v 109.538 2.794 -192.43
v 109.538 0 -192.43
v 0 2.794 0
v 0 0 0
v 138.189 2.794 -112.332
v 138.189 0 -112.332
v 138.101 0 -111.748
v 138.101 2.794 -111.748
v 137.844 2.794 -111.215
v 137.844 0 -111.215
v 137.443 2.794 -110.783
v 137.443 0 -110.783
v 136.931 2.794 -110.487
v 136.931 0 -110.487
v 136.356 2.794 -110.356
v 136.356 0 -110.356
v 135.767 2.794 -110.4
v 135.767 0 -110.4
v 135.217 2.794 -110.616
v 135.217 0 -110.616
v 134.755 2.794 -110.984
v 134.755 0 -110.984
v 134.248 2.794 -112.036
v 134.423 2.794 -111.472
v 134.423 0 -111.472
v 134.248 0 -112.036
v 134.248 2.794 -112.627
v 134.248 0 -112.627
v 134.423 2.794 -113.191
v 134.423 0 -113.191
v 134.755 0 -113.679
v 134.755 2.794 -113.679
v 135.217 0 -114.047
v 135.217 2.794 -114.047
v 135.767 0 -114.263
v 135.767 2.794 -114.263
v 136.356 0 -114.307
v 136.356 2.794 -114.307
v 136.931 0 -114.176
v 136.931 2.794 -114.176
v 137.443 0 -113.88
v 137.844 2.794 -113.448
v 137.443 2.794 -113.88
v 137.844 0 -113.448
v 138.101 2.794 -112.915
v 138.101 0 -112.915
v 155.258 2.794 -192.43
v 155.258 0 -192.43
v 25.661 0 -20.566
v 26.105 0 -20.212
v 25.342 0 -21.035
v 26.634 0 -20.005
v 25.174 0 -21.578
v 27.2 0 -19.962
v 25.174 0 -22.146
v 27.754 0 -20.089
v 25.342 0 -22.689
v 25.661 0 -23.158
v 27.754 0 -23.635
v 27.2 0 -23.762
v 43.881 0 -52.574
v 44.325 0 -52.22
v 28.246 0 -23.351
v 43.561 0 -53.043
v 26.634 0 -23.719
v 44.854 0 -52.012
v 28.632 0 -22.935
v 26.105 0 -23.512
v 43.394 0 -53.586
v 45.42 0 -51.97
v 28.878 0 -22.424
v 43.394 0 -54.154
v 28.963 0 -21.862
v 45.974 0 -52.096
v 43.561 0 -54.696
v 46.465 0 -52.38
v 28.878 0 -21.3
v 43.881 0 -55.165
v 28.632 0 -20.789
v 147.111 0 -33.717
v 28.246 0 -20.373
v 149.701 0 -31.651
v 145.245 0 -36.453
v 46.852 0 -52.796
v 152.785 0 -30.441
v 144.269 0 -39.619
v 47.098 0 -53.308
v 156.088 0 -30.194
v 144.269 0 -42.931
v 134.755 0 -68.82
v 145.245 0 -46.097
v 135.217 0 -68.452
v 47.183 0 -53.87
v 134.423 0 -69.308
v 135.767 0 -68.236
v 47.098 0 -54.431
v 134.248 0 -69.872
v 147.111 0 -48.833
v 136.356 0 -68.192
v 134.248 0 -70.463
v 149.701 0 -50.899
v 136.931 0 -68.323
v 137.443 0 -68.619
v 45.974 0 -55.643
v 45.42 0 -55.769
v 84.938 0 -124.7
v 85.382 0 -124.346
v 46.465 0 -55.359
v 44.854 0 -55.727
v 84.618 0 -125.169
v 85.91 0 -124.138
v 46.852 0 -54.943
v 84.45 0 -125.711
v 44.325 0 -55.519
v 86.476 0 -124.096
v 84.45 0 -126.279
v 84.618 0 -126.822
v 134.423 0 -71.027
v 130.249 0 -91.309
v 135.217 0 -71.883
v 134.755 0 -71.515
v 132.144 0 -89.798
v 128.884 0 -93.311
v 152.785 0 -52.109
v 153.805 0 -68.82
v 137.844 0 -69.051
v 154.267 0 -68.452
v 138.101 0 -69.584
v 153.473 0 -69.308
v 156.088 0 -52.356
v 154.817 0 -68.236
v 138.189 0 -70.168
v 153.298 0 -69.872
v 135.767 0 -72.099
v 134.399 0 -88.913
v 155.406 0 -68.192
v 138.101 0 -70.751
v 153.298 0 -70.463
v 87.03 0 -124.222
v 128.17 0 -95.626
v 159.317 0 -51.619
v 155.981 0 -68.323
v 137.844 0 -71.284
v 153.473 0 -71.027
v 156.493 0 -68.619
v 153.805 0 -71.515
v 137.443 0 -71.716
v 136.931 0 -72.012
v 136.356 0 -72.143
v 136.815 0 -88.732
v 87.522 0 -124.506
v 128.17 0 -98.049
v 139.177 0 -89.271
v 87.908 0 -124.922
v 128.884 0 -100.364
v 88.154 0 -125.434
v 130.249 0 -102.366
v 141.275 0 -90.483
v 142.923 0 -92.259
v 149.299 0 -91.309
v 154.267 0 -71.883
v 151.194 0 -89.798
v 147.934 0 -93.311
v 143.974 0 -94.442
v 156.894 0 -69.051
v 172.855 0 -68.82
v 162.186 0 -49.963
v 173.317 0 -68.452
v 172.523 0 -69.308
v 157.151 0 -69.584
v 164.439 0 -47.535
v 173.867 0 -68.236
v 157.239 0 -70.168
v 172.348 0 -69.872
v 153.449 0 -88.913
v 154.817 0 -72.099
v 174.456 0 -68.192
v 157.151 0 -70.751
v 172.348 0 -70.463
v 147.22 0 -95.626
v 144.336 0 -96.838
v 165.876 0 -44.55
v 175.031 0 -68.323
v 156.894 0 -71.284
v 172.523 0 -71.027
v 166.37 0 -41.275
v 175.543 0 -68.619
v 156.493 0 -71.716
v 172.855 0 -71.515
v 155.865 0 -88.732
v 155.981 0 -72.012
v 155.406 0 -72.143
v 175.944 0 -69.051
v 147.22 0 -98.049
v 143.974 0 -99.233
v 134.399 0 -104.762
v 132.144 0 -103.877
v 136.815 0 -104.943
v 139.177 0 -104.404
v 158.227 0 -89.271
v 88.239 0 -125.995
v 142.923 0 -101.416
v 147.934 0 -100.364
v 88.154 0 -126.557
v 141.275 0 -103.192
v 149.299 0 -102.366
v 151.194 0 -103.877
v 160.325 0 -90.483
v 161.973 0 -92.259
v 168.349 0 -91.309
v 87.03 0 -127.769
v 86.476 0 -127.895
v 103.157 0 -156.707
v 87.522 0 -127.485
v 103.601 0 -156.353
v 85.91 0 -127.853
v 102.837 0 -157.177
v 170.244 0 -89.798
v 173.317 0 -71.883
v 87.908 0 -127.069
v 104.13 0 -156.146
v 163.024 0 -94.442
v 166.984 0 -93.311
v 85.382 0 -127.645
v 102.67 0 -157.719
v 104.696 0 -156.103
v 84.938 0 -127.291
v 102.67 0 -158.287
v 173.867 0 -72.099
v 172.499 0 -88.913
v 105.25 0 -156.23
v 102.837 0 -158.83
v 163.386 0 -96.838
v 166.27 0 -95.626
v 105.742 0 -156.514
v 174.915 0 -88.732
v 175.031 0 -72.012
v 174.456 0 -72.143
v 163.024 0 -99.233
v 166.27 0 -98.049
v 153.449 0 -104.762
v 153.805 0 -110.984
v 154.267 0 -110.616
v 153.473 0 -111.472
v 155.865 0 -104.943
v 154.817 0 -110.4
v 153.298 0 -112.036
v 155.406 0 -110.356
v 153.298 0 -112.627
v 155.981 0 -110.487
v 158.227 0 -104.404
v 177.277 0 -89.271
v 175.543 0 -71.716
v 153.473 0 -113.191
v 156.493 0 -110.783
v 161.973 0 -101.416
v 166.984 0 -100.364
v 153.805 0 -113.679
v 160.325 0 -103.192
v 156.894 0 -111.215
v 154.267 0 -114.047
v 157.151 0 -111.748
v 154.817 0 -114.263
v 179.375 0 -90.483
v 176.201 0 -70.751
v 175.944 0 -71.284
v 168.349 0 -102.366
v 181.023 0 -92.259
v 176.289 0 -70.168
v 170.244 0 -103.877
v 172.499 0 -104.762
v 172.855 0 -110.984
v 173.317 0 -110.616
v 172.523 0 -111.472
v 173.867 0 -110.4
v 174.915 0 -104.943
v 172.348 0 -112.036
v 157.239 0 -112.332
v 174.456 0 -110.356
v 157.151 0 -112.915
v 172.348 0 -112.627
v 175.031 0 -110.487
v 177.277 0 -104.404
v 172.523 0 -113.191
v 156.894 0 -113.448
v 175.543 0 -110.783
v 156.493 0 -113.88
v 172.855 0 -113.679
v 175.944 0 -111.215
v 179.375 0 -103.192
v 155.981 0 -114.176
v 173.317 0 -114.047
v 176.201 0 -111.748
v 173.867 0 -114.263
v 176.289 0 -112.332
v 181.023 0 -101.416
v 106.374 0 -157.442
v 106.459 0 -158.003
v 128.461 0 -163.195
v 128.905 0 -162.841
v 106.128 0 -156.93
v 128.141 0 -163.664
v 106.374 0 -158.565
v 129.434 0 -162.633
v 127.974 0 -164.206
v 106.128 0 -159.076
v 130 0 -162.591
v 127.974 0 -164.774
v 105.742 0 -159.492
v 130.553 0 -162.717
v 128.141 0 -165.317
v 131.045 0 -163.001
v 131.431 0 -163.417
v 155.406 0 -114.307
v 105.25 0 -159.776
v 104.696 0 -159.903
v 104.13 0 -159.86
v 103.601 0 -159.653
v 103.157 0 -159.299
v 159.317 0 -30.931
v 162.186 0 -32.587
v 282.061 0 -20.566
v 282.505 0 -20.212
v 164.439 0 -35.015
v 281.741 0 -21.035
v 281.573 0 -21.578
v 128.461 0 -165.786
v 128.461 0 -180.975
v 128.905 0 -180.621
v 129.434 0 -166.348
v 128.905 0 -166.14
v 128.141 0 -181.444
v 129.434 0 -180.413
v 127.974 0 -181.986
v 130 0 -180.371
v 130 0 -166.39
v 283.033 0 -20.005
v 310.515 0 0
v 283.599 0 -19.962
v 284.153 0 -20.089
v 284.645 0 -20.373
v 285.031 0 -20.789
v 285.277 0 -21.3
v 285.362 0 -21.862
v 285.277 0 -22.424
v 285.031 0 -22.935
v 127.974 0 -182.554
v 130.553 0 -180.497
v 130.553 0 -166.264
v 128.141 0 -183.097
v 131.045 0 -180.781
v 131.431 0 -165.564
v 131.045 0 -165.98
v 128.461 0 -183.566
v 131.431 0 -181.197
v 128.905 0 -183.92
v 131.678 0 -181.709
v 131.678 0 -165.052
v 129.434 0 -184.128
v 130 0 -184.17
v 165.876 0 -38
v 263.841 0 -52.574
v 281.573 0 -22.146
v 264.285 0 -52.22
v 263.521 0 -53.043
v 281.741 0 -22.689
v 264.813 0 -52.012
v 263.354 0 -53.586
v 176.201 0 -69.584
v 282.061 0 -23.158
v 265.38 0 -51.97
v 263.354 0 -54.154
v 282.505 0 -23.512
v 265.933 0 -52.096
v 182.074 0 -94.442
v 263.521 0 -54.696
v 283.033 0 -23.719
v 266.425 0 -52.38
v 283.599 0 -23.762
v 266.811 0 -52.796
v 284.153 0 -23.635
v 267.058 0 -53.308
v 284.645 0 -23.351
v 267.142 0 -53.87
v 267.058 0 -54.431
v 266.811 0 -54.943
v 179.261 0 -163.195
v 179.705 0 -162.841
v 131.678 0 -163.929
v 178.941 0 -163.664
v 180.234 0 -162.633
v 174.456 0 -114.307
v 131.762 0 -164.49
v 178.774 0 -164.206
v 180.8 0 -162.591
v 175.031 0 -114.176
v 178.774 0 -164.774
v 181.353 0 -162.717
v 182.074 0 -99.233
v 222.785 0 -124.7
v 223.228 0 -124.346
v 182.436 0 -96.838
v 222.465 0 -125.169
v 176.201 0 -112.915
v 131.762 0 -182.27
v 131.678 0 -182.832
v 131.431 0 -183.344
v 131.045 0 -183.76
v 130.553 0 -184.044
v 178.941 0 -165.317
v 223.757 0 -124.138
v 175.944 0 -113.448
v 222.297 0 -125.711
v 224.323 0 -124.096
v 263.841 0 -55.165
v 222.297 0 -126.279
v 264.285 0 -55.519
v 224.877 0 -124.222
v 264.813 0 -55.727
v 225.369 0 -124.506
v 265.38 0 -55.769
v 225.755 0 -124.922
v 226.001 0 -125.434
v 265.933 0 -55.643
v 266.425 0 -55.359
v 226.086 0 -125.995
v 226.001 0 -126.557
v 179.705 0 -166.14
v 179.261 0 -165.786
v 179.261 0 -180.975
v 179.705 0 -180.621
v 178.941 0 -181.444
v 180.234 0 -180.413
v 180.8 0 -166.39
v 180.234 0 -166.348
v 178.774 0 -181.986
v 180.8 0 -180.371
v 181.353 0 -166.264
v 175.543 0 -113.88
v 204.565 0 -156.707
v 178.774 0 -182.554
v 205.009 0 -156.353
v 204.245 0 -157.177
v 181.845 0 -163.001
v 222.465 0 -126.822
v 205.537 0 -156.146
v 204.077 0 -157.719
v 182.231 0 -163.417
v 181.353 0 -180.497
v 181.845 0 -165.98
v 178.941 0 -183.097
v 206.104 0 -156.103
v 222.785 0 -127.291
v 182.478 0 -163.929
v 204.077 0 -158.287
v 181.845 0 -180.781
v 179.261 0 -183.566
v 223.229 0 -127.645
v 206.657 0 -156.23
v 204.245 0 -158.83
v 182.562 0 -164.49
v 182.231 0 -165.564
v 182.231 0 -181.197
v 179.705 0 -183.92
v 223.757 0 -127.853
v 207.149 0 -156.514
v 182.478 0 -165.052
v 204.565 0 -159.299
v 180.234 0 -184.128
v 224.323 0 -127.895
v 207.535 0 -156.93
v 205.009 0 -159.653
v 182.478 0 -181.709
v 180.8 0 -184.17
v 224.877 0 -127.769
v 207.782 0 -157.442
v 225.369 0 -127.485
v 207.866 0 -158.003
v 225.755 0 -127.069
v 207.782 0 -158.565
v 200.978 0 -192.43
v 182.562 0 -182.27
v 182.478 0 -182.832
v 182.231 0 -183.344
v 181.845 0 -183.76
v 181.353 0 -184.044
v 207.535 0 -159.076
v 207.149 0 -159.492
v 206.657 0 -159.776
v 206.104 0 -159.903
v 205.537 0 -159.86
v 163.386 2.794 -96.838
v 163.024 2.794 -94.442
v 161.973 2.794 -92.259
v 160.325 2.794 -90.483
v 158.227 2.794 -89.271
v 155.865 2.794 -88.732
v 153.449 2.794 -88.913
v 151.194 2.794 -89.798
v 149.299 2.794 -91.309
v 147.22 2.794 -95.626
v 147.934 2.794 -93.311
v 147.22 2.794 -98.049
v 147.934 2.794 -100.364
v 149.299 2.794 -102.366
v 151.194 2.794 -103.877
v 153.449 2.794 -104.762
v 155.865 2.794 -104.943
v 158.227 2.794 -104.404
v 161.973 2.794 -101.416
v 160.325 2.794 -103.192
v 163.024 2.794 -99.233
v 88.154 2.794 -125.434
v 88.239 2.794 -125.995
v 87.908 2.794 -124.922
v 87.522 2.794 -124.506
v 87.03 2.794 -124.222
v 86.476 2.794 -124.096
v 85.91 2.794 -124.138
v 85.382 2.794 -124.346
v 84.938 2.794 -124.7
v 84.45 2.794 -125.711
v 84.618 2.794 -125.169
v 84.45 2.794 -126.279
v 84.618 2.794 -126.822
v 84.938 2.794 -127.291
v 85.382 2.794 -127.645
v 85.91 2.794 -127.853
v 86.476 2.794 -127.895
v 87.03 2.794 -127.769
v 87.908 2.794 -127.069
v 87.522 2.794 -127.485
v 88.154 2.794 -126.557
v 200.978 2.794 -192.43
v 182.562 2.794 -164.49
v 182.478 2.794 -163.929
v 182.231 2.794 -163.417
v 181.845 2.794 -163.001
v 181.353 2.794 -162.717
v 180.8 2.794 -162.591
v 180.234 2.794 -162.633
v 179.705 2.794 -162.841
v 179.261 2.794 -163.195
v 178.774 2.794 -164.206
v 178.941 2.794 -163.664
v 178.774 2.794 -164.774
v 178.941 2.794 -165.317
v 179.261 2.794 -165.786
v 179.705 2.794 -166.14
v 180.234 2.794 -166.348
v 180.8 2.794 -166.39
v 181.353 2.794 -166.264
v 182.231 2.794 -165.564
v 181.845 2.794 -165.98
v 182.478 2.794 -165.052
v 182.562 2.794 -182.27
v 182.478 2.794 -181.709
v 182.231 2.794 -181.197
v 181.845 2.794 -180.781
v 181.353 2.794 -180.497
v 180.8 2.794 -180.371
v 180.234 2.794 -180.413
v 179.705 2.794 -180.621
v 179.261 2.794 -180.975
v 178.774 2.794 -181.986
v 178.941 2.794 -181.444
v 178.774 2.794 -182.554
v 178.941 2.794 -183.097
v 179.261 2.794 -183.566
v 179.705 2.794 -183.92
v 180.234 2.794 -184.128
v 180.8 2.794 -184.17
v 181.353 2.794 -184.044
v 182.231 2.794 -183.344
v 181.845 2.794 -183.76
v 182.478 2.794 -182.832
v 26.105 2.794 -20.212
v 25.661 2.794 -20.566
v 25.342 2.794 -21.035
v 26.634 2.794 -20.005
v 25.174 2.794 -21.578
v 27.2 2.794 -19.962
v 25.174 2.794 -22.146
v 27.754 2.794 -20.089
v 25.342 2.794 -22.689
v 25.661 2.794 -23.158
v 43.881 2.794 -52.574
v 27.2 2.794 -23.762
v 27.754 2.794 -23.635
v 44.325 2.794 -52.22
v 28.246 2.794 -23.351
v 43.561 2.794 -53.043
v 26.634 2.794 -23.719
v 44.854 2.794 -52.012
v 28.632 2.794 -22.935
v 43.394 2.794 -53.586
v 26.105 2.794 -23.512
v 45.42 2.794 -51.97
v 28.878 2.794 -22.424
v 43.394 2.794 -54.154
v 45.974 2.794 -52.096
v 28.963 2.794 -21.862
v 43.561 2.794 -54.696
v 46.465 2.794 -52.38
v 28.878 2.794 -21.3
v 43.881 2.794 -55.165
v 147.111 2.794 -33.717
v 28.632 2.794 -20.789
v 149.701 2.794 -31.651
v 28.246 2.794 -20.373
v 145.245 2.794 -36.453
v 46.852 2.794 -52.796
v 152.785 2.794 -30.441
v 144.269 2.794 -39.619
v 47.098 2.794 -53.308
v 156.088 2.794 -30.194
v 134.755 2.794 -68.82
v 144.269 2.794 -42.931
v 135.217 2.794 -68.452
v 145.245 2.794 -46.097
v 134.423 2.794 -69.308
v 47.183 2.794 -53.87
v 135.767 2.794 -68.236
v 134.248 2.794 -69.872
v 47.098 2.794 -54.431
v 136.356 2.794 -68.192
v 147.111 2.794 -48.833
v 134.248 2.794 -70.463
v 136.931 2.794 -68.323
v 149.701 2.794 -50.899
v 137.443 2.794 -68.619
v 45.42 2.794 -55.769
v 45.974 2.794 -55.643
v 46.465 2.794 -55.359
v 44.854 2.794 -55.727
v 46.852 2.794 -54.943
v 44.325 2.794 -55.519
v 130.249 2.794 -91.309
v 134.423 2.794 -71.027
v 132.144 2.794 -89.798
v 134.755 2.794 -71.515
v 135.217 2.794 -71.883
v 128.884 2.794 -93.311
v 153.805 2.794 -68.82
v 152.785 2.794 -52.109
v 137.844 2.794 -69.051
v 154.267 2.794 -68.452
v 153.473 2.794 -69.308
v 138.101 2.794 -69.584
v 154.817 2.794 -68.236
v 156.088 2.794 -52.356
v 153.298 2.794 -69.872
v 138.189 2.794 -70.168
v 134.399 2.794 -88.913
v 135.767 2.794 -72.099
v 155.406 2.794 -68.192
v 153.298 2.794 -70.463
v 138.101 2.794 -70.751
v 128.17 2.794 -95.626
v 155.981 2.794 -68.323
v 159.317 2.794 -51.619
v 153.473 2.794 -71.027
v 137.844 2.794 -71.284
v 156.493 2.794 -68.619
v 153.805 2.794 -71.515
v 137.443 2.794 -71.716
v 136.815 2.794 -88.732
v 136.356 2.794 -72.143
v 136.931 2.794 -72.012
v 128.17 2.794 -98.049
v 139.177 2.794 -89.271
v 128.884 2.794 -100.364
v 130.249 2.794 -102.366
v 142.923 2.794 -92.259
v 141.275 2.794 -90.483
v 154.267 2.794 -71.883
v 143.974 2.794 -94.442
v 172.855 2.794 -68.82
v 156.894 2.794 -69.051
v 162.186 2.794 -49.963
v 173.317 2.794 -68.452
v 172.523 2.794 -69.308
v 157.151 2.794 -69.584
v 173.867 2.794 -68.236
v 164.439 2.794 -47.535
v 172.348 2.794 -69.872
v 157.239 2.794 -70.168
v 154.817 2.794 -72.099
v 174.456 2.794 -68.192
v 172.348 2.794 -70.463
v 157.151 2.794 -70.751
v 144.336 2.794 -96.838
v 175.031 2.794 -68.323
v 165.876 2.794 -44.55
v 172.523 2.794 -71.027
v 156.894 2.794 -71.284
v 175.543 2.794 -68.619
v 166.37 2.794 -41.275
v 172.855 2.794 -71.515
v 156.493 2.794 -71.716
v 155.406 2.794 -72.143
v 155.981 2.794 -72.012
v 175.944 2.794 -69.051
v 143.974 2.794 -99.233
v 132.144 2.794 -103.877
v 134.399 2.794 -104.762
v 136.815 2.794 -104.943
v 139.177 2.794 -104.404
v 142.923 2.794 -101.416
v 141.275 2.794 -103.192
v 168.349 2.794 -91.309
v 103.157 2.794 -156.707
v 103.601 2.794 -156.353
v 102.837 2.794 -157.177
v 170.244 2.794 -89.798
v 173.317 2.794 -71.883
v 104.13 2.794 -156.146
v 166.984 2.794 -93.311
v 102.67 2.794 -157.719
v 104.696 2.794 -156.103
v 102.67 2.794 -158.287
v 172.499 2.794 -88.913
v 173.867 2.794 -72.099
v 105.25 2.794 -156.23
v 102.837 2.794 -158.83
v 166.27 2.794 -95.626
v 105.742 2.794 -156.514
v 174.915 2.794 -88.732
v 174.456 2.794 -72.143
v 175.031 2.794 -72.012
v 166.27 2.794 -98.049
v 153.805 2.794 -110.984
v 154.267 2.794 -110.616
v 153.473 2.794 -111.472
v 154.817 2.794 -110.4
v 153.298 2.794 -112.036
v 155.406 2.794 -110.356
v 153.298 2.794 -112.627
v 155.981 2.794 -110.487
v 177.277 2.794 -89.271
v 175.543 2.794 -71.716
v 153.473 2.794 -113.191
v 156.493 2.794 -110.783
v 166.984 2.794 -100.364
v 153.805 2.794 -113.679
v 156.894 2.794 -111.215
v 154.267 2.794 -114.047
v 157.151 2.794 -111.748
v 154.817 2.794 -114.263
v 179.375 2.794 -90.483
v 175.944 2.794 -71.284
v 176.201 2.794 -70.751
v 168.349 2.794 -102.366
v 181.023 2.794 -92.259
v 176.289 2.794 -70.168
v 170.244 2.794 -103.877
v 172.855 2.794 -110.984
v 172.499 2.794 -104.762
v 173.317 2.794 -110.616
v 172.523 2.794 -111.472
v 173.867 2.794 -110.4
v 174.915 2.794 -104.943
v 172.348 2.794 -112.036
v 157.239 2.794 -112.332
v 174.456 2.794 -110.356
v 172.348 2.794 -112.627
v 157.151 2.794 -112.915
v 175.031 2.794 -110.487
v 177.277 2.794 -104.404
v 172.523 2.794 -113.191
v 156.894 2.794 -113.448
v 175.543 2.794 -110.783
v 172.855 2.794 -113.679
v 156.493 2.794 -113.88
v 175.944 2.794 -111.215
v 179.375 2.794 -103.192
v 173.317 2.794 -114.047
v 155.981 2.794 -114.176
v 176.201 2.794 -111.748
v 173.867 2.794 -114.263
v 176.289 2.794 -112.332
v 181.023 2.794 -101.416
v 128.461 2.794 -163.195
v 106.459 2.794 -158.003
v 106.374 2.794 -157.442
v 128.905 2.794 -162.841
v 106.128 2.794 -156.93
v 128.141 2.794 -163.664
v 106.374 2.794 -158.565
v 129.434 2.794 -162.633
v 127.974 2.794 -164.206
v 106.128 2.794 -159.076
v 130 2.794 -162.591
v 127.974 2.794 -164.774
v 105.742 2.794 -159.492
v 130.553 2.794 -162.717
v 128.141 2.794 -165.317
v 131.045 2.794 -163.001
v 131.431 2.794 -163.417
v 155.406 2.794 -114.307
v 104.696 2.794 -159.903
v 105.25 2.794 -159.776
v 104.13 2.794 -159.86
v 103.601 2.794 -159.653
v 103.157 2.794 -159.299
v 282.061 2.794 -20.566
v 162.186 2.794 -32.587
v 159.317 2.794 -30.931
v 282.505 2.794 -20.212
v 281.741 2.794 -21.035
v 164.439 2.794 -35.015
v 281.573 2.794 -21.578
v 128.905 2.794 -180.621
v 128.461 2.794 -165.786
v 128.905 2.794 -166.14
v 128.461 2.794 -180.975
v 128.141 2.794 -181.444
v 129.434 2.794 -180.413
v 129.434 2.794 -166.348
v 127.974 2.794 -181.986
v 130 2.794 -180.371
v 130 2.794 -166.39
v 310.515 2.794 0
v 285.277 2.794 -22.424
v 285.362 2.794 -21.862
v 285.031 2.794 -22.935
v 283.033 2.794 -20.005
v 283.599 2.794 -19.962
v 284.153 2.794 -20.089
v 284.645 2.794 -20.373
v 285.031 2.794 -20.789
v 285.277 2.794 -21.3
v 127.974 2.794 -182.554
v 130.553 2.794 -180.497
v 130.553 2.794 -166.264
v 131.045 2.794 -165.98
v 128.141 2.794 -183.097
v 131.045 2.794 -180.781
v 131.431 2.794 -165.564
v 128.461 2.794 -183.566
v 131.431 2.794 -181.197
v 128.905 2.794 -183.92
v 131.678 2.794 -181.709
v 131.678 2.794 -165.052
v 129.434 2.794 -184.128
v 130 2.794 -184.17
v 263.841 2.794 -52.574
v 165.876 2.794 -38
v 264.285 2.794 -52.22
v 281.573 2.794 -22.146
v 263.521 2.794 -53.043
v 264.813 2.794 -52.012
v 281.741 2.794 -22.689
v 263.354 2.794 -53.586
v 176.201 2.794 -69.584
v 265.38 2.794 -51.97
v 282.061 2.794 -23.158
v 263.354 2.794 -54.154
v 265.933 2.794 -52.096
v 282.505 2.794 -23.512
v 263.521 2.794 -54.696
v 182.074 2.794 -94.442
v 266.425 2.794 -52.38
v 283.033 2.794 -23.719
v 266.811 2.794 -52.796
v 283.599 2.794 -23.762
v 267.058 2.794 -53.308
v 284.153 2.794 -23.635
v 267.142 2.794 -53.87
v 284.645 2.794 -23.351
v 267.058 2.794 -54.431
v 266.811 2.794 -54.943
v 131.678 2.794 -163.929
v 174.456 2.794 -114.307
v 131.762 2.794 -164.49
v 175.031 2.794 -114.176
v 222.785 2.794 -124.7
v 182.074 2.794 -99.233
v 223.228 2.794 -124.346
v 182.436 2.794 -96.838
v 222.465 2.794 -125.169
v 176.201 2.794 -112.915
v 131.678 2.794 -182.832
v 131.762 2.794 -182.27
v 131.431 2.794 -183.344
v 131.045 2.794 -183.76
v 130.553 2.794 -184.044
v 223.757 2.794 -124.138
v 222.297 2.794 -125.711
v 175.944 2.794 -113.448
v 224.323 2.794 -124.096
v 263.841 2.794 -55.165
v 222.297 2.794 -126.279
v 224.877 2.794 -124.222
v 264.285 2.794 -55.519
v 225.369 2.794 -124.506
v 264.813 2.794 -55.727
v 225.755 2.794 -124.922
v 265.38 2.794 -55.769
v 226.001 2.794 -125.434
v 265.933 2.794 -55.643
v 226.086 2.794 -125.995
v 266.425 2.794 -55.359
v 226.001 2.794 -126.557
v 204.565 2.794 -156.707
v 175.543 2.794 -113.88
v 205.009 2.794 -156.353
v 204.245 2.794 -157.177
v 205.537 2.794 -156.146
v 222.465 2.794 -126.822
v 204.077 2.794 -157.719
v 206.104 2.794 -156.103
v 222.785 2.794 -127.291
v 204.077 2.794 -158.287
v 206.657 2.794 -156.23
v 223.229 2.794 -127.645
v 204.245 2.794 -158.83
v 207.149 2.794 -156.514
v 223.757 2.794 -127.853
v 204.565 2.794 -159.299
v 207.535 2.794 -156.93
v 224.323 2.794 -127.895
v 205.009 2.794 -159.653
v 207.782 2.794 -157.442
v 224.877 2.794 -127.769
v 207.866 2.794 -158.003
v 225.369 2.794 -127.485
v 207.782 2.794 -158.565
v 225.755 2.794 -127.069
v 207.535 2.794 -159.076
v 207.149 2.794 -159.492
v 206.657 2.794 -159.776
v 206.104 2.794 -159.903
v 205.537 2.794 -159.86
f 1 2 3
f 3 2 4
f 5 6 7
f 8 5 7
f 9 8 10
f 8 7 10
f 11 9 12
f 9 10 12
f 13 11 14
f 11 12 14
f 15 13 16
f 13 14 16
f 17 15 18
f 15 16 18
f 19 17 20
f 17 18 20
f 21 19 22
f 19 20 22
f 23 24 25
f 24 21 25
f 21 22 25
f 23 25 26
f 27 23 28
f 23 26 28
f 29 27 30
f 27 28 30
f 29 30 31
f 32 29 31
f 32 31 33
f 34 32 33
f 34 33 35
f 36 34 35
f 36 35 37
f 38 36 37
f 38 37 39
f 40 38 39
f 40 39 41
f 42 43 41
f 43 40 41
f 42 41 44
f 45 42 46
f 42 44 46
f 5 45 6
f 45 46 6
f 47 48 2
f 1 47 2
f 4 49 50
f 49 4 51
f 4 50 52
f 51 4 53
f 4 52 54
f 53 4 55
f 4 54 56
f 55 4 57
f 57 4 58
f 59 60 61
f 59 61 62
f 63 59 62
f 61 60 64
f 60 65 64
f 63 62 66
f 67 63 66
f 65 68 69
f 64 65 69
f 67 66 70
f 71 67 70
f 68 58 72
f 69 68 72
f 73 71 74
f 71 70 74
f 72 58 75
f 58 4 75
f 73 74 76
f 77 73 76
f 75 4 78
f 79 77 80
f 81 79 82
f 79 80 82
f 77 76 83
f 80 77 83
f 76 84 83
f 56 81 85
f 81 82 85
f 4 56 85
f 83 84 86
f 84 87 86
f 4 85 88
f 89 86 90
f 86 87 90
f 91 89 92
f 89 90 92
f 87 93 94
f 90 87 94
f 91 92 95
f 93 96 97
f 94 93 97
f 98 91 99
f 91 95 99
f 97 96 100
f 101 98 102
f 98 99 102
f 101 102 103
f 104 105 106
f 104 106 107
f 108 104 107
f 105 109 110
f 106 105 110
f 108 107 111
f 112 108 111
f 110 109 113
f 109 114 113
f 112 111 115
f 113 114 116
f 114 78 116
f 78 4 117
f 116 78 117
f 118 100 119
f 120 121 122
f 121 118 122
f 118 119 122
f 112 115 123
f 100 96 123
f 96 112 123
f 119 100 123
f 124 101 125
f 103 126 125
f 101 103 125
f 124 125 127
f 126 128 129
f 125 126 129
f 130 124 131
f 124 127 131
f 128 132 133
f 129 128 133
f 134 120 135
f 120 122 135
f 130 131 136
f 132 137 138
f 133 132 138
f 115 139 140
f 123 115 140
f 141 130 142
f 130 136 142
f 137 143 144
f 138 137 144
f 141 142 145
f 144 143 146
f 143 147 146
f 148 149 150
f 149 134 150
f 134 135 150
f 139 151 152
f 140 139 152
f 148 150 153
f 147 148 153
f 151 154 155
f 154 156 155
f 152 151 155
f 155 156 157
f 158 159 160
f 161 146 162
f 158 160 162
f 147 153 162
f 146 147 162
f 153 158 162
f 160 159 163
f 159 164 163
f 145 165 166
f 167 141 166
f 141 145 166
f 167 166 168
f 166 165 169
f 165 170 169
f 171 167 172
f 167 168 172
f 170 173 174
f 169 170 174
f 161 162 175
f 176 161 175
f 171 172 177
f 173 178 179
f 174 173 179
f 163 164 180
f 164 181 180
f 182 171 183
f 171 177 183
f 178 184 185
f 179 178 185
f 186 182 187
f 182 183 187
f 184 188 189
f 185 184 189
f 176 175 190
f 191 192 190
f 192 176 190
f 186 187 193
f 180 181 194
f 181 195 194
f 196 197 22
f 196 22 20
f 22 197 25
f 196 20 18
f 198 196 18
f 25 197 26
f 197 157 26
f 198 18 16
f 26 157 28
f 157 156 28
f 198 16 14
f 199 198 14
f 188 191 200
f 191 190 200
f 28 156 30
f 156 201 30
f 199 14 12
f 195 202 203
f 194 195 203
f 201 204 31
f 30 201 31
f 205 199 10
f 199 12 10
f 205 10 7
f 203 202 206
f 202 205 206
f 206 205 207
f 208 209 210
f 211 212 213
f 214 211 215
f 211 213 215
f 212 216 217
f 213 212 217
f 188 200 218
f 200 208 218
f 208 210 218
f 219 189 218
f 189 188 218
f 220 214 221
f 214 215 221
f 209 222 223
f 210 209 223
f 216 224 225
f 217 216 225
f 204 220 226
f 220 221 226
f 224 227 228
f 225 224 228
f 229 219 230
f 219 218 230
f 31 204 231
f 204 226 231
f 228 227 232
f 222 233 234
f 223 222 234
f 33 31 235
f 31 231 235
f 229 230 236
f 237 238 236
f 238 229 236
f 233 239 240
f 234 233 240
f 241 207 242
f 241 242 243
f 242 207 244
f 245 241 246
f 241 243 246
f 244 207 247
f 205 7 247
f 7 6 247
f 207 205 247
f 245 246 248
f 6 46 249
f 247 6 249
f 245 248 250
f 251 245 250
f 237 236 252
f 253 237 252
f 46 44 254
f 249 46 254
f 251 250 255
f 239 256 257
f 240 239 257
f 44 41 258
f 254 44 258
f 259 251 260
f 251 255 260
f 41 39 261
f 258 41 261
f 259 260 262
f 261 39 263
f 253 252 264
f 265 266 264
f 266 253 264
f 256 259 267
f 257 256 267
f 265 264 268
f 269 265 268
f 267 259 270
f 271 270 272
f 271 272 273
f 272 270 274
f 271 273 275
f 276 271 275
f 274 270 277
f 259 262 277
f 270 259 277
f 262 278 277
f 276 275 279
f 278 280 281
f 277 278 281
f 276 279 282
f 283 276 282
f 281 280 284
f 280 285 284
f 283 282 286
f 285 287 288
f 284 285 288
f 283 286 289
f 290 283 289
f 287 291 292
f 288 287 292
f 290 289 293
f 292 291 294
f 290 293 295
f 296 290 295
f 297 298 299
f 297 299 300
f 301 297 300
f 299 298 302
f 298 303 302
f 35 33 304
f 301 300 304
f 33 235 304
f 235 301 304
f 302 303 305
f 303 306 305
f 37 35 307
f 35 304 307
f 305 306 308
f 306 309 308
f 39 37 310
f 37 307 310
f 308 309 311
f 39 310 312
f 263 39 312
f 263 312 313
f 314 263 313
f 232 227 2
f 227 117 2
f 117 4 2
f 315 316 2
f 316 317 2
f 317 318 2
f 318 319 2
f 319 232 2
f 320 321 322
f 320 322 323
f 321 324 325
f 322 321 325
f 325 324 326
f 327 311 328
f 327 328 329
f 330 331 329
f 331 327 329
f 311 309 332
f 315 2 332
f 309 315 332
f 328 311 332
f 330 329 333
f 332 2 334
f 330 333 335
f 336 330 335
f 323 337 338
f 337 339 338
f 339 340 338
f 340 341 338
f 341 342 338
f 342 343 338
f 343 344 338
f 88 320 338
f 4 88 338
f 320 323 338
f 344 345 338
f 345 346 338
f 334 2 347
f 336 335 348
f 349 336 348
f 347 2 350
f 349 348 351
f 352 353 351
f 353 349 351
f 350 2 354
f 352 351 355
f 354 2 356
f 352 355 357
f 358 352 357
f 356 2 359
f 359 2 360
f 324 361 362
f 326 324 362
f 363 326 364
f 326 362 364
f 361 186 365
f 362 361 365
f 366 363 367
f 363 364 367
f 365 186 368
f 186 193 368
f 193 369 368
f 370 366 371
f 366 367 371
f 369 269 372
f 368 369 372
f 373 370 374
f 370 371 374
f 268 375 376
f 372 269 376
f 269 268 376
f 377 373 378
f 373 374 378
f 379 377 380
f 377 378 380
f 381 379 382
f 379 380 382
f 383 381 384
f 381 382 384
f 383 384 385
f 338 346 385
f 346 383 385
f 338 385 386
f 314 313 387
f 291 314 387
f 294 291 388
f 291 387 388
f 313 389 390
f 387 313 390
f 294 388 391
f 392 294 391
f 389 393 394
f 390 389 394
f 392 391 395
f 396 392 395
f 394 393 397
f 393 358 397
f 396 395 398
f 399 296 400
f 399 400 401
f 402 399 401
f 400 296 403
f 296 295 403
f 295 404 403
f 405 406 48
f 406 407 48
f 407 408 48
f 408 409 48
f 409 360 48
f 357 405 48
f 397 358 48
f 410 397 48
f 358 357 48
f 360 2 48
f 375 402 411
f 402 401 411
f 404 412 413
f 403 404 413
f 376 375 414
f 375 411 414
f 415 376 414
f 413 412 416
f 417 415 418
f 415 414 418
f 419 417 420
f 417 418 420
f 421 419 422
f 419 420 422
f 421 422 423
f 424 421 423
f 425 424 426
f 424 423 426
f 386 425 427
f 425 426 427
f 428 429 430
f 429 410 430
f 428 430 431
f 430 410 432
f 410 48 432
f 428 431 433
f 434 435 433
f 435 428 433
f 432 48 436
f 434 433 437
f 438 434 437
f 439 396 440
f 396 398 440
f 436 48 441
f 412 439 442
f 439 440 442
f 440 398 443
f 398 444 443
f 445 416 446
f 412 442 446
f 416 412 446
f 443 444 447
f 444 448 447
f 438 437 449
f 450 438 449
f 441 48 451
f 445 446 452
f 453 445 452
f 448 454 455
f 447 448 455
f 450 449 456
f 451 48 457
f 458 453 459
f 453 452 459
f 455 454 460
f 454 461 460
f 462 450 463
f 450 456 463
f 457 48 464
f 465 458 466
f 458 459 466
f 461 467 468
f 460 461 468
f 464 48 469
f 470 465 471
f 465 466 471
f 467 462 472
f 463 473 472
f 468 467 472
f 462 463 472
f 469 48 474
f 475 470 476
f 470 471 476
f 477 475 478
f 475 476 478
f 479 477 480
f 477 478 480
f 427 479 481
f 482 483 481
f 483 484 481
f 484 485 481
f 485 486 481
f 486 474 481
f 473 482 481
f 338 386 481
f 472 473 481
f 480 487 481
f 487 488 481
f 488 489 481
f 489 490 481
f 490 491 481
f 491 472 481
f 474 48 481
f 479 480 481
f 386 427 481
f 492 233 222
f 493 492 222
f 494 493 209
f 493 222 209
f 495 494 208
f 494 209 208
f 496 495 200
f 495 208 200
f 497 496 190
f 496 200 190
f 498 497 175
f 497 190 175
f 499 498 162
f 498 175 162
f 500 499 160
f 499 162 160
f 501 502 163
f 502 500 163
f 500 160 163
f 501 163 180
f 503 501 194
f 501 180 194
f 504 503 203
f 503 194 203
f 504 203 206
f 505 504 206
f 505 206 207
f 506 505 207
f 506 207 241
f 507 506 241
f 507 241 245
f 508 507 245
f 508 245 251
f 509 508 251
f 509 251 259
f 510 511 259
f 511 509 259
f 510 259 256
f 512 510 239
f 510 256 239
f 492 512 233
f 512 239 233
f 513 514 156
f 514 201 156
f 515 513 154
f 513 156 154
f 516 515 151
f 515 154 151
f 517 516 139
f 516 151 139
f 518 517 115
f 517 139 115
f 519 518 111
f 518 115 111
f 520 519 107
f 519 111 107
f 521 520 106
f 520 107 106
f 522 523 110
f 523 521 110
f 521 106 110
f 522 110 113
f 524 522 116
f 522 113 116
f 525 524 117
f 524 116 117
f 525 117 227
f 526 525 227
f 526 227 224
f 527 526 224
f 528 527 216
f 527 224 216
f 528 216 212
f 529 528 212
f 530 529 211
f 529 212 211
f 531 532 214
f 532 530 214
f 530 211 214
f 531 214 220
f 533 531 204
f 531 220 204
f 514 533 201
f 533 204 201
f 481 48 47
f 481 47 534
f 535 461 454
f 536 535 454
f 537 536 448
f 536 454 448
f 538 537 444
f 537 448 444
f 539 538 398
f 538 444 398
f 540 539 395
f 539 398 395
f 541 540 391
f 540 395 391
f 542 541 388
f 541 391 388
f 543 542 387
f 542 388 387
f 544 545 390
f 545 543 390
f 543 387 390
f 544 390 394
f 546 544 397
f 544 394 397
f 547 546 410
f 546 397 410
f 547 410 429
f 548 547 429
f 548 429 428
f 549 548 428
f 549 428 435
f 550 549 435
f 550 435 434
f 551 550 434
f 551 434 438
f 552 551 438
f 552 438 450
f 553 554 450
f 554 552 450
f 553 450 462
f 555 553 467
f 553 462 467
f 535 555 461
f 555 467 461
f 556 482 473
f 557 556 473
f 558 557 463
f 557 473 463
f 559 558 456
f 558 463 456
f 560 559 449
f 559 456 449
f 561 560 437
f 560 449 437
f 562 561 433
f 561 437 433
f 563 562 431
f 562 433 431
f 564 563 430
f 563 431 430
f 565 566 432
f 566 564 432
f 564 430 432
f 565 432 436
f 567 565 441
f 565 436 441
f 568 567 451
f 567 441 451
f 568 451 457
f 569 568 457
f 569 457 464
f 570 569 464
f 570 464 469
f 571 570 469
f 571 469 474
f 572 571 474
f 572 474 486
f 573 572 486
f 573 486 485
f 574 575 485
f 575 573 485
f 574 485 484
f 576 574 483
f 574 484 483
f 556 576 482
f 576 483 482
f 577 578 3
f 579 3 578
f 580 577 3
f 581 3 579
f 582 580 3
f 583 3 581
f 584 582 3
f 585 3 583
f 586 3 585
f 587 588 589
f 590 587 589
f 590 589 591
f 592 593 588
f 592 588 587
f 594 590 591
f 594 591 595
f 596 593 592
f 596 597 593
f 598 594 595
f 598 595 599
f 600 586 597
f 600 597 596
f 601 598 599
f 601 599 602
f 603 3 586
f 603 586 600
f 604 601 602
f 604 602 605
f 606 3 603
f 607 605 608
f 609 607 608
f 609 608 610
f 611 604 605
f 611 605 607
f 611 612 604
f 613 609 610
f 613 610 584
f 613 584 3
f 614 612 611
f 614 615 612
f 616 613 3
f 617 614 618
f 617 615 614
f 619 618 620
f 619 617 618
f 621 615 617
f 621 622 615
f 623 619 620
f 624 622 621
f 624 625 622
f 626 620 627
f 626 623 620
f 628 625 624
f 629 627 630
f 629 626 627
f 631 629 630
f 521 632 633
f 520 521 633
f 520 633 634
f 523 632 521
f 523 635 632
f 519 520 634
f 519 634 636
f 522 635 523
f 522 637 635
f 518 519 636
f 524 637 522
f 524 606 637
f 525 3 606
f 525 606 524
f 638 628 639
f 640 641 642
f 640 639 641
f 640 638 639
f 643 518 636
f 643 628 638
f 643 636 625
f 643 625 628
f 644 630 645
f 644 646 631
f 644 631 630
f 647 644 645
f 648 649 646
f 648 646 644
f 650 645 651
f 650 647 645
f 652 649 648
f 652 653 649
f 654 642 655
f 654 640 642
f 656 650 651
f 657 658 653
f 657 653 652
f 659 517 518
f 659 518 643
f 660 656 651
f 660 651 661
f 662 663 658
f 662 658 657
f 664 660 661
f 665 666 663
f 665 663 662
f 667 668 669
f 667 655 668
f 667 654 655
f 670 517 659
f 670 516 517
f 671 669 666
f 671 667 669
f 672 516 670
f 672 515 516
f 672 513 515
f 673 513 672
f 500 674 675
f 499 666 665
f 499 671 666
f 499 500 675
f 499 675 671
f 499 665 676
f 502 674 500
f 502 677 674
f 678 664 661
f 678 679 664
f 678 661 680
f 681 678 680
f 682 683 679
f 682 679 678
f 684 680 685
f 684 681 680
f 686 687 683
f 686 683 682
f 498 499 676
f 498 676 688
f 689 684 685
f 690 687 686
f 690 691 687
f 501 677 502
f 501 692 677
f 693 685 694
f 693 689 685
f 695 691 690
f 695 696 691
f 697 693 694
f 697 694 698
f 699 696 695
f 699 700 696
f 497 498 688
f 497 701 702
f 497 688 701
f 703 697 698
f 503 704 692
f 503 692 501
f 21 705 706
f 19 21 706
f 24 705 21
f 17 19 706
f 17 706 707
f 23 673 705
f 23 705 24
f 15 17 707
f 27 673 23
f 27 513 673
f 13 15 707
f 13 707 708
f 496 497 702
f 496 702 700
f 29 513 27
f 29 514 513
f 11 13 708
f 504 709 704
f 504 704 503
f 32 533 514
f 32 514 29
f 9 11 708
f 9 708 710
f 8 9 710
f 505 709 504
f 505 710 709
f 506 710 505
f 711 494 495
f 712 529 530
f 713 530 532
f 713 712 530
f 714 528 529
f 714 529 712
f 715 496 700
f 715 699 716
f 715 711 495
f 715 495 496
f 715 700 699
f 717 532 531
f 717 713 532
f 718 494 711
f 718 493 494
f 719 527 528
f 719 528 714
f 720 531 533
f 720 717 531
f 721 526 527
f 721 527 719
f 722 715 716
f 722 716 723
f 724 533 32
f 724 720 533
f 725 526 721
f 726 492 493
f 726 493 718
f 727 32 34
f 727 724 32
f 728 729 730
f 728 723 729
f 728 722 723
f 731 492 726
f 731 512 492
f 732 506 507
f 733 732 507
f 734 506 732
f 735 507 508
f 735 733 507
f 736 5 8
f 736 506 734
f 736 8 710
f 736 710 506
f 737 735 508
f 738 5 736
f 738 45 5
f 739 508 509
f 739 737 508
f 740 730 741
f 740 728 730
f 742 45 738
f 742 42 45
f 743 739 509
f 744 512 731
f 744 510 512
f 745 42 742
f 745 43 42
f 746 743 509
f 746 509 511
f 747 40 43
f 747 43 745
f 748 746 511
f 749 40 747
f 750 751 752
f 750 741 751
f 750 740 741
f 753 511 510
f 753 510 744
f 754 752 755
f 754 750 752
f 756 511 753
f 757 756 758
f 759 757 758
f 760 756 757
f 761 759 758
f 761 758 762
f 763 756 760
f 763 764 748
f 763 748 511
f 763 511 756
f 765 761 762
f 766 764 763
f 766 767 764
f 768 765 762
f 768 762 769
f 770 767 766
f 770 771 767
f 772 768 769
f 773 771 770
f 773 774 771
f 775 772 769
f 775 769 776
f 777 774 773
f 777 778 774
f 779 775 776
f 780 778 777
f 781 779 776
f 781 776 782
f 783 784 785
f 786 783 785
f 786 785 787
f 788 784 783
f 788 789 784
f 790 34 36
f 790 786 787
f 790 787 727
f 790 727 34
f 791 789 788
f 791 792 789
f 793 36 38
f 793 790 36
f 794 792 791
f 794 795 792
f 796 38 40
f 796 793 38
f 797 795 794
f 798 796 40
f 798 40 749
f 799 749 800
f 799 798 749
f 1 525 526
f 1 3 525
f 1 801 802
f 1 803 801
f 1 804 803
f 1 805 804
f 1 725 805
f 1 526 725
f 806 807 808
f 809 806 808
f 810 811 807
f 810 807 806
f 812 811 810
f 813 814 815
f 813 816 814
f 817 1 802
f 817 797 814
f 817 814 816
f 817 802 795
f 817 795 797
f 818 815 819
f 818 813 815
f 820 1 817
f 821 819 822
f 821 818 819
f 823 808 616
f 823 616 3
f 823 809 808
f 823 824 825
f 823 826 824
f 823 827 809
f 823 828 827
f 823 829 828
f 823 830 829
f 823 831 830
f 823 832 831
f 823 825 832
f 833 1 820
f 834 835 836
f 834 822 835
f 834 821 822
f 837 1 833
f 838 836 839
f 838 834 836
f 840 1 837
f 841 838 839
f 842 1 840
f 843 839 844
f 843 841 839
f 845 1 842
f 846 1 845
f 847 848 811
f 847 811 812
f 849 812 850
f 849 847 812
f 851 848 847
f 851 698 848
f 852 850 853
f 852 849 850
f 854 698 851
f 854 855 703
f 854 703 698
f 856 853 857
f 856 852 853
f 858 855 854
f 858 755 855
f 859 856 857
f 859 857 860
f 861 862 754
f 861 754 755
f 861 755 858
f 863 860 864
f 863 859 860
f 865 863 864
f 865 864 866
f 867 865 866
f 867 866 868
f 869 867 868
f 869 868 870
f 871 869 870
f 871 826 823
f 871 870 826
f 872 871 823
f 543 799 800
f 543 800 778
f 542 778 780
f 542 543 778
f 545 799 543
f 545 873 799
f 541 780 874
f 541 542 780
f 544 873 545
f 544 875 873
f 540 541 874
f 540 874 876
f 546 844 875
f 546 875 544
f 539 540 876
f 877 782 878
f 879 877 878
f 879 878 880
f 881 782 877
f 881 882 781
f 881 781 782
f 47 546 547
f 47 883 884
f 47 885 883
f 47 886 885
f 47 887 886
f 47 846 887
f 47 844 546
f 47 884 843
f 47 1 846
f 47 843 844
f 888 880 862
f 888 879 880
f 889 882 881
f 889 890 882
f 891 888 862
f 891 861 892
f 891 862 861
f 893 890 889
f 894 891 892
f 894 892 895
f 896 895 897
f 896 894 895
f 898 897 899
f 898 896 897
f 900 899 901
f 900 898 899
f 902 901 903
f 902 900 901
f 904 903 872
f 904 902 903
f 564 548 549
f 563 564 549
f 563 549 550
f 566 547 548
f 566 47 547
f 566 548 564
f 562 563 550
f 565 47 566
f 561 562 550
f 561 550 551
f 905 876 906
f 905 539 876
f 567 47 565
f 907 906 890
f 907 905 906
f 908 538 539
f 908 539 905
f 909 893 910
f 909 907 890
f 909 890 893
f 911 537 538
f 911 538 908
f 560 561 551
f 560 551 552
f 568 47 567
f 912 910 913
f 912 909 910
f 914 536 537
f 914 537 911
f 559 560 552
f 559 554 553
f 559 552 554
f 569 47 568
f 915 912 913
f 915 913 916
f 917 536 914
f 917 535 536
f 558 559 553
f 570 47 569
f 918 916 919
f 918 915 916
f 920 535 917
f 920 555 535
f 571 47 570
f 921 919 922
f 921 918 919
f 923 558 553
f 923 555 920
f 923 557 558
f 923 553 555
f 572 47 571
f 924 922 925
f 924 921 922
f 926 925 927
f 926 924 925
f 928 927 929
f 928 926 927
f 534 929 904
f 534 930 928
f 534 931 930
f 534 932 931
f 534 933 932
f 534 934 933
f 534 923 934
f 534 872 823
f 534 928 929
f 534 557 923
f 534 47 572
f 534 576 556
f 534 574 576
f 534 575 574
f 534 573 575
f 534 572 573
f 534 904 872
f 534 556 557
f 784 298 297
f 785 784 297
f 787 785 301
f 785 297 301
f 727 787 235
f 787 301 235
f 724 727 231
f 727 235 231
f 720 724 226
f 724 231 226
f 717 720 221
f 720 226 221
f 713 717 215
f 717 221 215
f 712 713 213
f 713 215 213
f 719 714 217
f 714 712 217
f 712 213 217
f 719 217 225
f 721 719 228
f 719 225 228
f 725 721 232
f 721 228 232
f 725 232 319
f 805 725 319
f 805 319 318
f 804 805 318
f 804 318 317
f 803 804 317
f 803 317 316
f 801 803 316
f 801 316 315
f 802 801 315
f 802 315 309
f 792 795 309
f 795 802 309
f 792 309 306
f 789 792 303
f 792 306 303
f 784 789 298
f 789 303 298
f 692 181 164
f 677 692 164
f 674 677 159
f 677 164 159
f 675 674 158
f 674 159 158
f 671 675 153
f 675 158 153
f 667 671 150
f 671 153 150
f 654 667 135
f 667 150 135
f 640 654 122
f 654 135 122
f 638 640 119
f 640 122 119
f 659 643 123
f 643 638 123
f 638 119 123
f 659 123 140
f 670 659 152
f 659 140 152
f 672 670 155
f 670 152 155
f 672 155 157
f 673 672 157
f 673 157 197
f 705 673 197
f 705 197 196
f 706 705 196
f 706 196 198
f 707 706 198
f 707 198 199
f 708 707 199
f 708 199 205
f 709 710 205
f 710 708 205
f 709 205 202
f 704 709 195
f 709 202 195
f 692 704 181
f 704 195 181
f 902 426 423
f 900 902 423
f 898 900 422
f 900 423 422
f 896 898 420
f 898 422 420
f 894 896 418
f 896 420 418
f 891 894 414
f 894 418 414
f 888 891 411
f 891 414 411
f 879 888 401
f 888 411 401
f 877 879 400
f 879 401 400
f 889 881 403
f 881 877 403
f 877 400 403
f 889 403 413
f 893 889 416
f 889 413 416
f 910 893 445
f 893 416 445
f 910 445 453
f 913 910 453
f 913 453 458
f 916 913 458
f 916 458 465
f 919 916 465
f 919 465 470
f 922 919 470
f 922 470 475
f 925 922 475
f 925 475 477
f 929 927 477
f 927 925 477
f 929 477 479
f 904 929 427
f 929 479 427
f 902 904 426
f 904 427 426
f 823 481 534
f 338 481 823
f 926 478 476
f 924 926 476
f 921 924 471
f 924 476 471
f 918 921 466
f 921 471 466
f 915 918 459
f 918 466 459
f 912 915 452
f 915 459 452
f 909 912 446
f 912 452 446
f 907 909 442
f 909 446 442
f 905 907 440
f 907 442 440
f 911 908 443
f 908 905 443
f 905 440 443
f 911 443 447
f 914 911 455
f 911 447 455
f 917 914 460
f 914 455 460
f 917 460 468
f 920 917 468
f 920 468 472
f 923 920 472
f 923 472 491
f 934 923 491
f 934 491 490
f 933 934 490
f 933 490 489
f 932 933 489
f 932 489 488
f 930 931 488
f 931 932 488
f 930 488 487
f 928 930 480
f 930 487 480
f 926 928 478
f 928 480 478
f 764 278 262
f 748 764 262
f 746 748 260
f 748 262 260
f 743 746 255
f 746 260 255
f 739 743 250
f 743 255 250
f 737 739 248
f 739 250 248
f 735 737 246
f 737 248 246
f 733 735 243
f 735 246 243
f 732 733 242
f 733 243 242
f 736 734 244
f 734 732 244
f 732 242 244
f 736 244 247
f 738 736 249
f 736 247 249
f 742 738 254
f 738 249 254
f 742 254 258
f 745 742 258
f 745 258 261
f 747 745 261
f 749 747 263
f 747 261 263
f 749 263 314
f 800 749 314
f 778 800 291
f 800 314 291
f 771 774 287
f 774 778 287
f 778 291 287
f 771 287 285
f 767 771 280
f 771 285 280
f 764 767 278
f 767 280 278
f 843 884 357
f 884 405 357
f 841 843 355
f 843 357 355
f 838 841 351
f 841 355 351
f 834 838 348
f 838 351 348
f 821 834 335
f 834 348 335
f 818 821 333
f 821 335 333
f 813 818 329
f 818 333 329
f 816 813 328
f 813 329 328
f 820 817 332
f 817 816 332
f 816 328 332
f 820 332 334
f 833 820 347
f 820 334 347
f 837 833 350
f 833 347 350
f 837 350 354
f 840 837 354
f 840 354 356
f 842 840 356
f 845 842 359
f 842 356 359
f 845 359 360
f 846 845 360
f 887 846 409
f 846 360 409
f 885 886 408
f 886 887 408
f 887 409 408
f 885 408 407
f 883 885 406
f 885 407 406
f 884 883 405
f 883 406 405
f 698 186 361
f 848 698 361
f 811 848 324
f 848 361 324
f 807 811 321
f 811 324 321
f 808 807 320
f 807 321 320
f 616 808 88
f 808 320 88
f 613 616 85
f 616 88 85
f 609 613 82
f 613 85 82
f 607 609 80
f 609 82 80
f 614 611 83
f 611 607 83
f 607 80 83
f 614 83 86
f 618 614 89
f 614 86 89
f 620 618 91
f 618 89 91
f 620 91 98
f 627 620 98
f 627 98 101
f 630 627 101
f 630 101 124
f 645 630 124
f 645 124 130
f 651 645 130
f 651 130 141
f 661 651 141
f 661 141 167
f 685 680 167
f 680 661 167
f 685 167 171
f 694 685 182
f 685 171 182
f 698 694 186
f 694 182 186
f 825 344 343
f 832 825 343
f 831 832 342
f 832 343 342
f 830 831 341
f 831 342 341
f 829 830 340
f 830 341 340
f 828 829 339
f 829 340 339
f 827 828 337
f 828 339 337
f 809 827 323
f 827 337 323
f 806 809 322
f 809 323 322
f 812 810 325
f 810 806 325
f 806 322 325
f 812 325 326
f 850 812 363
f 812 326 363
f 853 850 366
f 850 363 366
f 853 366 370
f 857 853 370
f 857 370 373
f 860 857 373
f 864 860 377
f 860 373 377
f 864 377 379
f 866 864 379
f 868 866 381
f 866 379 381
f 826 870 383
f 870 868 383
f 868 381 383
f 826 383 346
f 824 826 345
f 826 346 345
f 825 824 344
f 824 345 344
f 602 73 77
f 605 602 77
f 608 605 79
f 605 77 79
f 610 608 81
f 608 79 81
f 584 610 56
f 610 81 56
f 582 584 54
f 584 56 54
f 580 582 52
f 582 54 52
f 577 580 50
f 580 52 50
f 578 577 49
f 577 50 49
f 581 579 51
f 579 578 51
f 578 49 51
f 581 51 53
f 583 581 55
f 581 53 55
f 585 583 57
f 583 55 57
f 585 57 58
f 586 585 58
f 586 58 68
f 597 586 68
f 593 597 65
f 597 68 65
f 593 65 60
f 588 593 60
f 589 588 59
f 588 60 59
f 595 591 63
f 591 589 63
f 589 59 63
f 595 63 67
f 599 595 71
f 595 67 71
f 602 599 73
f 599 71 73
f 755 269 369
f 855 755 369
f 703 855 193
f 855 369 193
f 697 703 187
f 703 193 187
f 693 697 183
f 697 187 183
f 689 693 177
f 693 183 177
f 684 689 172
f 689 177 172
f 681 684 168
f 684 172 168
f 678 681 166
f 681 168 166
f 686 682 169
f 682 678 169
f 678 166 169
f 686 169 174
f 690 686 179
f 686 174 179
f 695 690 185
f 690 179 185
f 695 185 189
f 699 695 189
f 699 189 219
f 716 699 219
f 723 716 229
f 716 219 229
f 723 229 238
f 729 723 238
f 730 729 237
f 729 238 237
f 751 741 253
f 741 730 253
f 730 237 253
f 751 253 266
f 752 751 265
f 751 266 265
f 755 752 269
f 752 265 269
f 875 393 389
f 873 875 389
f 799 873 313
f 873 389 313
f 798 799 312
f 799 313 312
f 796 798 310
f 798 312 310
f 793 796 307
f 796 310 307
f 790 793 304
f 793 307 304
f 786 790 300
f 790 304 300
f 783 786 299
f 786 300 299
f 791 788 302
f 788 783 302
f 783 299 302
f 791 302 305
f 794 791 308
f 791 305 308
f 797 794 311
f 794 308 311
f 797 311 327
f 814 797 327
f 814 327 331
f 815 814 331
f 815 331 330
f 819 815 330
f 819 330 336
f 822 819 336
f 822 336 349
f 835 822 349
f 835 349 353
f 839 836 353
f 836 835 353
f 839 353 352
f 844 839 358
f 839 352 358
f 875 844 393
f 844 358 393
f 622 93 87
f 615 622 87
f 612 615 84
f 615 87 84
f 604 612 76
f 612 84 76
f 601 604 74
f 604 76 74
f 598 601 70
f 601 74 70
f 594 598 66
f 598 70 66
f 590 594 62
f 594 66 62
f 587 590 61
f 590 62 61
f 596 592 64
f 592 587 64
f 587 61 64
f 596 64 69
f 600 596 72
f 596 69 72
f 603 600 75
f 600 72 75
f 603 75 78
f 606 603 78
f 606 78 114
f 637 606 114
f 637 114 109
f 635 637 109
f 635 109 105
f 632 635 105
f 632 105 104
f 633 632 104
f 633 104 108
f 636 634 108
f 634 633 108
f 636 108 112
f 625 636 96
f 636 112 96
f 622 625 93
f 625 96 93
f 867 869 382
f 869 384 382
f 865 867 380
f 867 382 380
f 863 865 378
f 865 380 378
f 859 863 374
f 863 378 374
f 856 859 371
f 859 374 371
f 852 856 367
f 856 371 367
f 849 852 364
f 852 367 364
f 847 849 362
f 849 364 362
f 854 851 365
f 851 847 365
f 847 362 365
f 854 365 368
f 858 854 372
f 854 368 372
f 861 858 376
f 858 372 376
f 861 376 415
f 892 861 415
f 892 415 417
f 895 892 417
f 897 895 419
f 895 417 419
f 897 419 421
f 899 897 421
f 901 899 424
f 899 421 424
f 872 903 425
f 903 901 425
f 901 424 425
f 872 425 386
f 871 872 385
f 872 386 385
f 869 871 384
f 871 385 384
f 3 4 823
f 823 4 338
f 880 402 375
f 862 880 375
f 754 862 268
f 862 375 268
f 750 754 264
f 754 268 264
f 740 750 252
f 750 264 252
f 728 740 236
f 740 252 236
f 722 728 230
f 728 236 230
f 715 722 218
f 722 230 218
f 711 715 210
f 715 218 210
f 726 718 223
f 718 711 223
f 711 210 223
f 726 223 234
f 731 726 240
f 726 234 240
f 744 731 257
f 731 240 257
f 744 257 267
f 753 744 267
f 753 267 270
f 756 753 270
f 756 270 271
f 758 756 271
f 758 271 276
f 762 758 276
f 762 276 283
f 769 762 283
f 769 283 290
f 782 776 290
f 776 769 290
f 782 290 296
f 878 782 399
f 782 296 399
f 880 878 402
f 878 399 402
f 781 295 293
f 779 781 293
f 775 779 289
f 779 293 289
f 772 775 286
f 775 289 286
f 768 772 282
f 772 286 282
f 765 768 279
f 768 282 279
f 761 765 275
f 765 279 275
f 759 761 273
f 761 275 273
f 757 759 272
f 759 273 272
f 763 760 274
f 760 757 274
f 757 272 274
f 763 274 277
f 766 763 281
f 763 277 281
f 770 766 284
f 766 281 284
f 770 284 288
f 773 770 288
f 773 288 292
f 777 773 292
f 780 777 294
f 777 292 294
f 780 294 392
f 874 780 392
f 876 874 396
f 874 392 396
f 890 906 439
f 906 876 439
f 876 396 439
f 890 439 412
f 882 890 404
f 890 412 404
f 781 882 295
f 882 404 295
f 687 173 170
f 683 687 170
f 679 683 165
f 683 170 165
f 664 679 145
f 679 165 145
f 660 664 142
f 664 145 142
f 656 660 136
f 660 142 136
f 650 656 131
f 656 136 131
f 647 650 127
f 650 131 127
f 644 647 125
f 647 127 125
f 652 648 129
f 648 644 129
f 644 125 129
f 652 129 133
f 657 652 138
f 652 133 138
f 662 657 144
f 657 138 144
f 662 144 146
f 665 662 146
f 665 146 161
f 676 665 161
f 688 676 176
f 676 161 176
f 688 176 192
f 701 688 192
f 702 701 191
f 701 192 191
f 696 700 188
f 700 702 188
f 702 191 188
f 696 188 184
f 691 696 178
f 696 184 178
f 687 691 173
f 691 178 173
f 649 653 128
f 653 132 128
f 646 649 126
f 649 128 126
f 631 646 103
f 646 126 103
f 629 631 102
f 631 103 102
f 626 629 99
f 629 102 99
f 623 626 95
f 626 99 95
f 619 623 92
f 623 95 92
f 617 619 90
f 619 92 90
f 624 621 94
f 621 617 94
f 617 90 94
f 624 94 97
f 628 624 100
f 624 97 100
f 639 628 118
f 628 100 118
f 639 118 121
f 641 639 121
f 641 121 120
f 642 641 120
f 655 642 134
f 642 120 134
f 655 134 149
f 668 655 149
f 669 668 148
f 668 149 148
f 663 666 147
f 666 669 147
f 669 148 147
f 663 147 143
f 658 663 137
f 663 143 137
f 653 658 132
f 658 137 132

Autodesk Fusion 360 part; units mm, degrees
sketch "Sketch1" plane through (0, 0, 0) normal (0, 1, 0) x (1, 0, 0)
  line L0 (0, 0) -> (310.515, 0)
  line L1 (155.2575, 192.4304) -> (109.5375, 192.4304)
  line L2 (155.2575, 192.4304) -> (200.9775, 192.4304)
  line L3 (200.9775, 192.4304) -> (310.515, 0)
  line L4 (109.5375, 192.4304) -> (0, 0)
  circle A0 centre (155.2575, 96.8375) radius 8.128
  circle A1 centre (174.3075, 70.1675) radius 1.9812
  circle A2 centre (174.3075, 112.3315) radius 1.9812
  circle A3 centre (155.2575, 41.275) radius 11.1125
  circle A4 centre (136.2075, 96.8375) radius 8.128
  circle A5 centre (155.2575, 70.1675) radius 1.9812
  circle A6 centre (136.2075, 70.1675) radius 1.9812
  circle A7 centre (174.3075, 96.8375) radius 8.128
  circle A8 centre (136.2075, 112.3315) radius 1.9812
  circle A9 centre (155.2575, 112.3315) radius 1.9812
  circle A10 centre (27.0579, 21.862) radius 1.905
  circle A11 centre (86.334, 125.9954) radius 1.905
  circle A12 centre (45.2777, 53.8696) radius 1.905
  circle A13 centre (129.8575, 164.4904) radius 1.905
  circle A14 centre (129.8575, 182.2704) radius 1.905
  circle A15 centre (104.5538, 158.0031) radius 1.905
  circle A16 centre (224.181, 125.9954) radius 1.905
  circle A17 centre (265.2373, 53.8696) radius 1.905
  circle A18 centre (180.6575, 182.2704) radius 1.905
  circle A19 centre (283.4571, 21.862) radius 1.905
  circle A20 centre (180.6575, 164.4904) radius 1.905
  circle A21 centre (205.9612, 158.0031) radius 1.905
  point P0 (104.5538, 158.0031)
  point P1 (205.9612, 158.0031)
  dimension "d1" = 310.515
  dimension "d3" = 45.72
  dimension "d4" = 45.72
  dimension "d45" = 22.225
  dimension "d46" = 16.256
  dimension "d47" = 26.67
  dimension "d48" = 3.9624
  dimension "d49" = 42.164
  dimension "d50" = 3.9624
  dimension "d51" = 16.256
  dimension "d52" = 26.67
  dimension "d53" = 3.9624
  dimension "d54" = 42.164
  dimension "d55" = 3.9624
  dimension "d56" = 16.256
  dimension "d57" = 26.67
  dimension "d58" = 3.9624
  dimension "d59" = 42.164
  dimension "d60" = 3.9624
extrude "Extrude5" add sketch "Sketch1" along normal blind 2.794
extrude "Extrude4" [suppressed]
equation "d3 = ( 3.6 / 2 ) * 1 in"
equation "d4 = ( 3.6 / 2 ) * 1 in"
